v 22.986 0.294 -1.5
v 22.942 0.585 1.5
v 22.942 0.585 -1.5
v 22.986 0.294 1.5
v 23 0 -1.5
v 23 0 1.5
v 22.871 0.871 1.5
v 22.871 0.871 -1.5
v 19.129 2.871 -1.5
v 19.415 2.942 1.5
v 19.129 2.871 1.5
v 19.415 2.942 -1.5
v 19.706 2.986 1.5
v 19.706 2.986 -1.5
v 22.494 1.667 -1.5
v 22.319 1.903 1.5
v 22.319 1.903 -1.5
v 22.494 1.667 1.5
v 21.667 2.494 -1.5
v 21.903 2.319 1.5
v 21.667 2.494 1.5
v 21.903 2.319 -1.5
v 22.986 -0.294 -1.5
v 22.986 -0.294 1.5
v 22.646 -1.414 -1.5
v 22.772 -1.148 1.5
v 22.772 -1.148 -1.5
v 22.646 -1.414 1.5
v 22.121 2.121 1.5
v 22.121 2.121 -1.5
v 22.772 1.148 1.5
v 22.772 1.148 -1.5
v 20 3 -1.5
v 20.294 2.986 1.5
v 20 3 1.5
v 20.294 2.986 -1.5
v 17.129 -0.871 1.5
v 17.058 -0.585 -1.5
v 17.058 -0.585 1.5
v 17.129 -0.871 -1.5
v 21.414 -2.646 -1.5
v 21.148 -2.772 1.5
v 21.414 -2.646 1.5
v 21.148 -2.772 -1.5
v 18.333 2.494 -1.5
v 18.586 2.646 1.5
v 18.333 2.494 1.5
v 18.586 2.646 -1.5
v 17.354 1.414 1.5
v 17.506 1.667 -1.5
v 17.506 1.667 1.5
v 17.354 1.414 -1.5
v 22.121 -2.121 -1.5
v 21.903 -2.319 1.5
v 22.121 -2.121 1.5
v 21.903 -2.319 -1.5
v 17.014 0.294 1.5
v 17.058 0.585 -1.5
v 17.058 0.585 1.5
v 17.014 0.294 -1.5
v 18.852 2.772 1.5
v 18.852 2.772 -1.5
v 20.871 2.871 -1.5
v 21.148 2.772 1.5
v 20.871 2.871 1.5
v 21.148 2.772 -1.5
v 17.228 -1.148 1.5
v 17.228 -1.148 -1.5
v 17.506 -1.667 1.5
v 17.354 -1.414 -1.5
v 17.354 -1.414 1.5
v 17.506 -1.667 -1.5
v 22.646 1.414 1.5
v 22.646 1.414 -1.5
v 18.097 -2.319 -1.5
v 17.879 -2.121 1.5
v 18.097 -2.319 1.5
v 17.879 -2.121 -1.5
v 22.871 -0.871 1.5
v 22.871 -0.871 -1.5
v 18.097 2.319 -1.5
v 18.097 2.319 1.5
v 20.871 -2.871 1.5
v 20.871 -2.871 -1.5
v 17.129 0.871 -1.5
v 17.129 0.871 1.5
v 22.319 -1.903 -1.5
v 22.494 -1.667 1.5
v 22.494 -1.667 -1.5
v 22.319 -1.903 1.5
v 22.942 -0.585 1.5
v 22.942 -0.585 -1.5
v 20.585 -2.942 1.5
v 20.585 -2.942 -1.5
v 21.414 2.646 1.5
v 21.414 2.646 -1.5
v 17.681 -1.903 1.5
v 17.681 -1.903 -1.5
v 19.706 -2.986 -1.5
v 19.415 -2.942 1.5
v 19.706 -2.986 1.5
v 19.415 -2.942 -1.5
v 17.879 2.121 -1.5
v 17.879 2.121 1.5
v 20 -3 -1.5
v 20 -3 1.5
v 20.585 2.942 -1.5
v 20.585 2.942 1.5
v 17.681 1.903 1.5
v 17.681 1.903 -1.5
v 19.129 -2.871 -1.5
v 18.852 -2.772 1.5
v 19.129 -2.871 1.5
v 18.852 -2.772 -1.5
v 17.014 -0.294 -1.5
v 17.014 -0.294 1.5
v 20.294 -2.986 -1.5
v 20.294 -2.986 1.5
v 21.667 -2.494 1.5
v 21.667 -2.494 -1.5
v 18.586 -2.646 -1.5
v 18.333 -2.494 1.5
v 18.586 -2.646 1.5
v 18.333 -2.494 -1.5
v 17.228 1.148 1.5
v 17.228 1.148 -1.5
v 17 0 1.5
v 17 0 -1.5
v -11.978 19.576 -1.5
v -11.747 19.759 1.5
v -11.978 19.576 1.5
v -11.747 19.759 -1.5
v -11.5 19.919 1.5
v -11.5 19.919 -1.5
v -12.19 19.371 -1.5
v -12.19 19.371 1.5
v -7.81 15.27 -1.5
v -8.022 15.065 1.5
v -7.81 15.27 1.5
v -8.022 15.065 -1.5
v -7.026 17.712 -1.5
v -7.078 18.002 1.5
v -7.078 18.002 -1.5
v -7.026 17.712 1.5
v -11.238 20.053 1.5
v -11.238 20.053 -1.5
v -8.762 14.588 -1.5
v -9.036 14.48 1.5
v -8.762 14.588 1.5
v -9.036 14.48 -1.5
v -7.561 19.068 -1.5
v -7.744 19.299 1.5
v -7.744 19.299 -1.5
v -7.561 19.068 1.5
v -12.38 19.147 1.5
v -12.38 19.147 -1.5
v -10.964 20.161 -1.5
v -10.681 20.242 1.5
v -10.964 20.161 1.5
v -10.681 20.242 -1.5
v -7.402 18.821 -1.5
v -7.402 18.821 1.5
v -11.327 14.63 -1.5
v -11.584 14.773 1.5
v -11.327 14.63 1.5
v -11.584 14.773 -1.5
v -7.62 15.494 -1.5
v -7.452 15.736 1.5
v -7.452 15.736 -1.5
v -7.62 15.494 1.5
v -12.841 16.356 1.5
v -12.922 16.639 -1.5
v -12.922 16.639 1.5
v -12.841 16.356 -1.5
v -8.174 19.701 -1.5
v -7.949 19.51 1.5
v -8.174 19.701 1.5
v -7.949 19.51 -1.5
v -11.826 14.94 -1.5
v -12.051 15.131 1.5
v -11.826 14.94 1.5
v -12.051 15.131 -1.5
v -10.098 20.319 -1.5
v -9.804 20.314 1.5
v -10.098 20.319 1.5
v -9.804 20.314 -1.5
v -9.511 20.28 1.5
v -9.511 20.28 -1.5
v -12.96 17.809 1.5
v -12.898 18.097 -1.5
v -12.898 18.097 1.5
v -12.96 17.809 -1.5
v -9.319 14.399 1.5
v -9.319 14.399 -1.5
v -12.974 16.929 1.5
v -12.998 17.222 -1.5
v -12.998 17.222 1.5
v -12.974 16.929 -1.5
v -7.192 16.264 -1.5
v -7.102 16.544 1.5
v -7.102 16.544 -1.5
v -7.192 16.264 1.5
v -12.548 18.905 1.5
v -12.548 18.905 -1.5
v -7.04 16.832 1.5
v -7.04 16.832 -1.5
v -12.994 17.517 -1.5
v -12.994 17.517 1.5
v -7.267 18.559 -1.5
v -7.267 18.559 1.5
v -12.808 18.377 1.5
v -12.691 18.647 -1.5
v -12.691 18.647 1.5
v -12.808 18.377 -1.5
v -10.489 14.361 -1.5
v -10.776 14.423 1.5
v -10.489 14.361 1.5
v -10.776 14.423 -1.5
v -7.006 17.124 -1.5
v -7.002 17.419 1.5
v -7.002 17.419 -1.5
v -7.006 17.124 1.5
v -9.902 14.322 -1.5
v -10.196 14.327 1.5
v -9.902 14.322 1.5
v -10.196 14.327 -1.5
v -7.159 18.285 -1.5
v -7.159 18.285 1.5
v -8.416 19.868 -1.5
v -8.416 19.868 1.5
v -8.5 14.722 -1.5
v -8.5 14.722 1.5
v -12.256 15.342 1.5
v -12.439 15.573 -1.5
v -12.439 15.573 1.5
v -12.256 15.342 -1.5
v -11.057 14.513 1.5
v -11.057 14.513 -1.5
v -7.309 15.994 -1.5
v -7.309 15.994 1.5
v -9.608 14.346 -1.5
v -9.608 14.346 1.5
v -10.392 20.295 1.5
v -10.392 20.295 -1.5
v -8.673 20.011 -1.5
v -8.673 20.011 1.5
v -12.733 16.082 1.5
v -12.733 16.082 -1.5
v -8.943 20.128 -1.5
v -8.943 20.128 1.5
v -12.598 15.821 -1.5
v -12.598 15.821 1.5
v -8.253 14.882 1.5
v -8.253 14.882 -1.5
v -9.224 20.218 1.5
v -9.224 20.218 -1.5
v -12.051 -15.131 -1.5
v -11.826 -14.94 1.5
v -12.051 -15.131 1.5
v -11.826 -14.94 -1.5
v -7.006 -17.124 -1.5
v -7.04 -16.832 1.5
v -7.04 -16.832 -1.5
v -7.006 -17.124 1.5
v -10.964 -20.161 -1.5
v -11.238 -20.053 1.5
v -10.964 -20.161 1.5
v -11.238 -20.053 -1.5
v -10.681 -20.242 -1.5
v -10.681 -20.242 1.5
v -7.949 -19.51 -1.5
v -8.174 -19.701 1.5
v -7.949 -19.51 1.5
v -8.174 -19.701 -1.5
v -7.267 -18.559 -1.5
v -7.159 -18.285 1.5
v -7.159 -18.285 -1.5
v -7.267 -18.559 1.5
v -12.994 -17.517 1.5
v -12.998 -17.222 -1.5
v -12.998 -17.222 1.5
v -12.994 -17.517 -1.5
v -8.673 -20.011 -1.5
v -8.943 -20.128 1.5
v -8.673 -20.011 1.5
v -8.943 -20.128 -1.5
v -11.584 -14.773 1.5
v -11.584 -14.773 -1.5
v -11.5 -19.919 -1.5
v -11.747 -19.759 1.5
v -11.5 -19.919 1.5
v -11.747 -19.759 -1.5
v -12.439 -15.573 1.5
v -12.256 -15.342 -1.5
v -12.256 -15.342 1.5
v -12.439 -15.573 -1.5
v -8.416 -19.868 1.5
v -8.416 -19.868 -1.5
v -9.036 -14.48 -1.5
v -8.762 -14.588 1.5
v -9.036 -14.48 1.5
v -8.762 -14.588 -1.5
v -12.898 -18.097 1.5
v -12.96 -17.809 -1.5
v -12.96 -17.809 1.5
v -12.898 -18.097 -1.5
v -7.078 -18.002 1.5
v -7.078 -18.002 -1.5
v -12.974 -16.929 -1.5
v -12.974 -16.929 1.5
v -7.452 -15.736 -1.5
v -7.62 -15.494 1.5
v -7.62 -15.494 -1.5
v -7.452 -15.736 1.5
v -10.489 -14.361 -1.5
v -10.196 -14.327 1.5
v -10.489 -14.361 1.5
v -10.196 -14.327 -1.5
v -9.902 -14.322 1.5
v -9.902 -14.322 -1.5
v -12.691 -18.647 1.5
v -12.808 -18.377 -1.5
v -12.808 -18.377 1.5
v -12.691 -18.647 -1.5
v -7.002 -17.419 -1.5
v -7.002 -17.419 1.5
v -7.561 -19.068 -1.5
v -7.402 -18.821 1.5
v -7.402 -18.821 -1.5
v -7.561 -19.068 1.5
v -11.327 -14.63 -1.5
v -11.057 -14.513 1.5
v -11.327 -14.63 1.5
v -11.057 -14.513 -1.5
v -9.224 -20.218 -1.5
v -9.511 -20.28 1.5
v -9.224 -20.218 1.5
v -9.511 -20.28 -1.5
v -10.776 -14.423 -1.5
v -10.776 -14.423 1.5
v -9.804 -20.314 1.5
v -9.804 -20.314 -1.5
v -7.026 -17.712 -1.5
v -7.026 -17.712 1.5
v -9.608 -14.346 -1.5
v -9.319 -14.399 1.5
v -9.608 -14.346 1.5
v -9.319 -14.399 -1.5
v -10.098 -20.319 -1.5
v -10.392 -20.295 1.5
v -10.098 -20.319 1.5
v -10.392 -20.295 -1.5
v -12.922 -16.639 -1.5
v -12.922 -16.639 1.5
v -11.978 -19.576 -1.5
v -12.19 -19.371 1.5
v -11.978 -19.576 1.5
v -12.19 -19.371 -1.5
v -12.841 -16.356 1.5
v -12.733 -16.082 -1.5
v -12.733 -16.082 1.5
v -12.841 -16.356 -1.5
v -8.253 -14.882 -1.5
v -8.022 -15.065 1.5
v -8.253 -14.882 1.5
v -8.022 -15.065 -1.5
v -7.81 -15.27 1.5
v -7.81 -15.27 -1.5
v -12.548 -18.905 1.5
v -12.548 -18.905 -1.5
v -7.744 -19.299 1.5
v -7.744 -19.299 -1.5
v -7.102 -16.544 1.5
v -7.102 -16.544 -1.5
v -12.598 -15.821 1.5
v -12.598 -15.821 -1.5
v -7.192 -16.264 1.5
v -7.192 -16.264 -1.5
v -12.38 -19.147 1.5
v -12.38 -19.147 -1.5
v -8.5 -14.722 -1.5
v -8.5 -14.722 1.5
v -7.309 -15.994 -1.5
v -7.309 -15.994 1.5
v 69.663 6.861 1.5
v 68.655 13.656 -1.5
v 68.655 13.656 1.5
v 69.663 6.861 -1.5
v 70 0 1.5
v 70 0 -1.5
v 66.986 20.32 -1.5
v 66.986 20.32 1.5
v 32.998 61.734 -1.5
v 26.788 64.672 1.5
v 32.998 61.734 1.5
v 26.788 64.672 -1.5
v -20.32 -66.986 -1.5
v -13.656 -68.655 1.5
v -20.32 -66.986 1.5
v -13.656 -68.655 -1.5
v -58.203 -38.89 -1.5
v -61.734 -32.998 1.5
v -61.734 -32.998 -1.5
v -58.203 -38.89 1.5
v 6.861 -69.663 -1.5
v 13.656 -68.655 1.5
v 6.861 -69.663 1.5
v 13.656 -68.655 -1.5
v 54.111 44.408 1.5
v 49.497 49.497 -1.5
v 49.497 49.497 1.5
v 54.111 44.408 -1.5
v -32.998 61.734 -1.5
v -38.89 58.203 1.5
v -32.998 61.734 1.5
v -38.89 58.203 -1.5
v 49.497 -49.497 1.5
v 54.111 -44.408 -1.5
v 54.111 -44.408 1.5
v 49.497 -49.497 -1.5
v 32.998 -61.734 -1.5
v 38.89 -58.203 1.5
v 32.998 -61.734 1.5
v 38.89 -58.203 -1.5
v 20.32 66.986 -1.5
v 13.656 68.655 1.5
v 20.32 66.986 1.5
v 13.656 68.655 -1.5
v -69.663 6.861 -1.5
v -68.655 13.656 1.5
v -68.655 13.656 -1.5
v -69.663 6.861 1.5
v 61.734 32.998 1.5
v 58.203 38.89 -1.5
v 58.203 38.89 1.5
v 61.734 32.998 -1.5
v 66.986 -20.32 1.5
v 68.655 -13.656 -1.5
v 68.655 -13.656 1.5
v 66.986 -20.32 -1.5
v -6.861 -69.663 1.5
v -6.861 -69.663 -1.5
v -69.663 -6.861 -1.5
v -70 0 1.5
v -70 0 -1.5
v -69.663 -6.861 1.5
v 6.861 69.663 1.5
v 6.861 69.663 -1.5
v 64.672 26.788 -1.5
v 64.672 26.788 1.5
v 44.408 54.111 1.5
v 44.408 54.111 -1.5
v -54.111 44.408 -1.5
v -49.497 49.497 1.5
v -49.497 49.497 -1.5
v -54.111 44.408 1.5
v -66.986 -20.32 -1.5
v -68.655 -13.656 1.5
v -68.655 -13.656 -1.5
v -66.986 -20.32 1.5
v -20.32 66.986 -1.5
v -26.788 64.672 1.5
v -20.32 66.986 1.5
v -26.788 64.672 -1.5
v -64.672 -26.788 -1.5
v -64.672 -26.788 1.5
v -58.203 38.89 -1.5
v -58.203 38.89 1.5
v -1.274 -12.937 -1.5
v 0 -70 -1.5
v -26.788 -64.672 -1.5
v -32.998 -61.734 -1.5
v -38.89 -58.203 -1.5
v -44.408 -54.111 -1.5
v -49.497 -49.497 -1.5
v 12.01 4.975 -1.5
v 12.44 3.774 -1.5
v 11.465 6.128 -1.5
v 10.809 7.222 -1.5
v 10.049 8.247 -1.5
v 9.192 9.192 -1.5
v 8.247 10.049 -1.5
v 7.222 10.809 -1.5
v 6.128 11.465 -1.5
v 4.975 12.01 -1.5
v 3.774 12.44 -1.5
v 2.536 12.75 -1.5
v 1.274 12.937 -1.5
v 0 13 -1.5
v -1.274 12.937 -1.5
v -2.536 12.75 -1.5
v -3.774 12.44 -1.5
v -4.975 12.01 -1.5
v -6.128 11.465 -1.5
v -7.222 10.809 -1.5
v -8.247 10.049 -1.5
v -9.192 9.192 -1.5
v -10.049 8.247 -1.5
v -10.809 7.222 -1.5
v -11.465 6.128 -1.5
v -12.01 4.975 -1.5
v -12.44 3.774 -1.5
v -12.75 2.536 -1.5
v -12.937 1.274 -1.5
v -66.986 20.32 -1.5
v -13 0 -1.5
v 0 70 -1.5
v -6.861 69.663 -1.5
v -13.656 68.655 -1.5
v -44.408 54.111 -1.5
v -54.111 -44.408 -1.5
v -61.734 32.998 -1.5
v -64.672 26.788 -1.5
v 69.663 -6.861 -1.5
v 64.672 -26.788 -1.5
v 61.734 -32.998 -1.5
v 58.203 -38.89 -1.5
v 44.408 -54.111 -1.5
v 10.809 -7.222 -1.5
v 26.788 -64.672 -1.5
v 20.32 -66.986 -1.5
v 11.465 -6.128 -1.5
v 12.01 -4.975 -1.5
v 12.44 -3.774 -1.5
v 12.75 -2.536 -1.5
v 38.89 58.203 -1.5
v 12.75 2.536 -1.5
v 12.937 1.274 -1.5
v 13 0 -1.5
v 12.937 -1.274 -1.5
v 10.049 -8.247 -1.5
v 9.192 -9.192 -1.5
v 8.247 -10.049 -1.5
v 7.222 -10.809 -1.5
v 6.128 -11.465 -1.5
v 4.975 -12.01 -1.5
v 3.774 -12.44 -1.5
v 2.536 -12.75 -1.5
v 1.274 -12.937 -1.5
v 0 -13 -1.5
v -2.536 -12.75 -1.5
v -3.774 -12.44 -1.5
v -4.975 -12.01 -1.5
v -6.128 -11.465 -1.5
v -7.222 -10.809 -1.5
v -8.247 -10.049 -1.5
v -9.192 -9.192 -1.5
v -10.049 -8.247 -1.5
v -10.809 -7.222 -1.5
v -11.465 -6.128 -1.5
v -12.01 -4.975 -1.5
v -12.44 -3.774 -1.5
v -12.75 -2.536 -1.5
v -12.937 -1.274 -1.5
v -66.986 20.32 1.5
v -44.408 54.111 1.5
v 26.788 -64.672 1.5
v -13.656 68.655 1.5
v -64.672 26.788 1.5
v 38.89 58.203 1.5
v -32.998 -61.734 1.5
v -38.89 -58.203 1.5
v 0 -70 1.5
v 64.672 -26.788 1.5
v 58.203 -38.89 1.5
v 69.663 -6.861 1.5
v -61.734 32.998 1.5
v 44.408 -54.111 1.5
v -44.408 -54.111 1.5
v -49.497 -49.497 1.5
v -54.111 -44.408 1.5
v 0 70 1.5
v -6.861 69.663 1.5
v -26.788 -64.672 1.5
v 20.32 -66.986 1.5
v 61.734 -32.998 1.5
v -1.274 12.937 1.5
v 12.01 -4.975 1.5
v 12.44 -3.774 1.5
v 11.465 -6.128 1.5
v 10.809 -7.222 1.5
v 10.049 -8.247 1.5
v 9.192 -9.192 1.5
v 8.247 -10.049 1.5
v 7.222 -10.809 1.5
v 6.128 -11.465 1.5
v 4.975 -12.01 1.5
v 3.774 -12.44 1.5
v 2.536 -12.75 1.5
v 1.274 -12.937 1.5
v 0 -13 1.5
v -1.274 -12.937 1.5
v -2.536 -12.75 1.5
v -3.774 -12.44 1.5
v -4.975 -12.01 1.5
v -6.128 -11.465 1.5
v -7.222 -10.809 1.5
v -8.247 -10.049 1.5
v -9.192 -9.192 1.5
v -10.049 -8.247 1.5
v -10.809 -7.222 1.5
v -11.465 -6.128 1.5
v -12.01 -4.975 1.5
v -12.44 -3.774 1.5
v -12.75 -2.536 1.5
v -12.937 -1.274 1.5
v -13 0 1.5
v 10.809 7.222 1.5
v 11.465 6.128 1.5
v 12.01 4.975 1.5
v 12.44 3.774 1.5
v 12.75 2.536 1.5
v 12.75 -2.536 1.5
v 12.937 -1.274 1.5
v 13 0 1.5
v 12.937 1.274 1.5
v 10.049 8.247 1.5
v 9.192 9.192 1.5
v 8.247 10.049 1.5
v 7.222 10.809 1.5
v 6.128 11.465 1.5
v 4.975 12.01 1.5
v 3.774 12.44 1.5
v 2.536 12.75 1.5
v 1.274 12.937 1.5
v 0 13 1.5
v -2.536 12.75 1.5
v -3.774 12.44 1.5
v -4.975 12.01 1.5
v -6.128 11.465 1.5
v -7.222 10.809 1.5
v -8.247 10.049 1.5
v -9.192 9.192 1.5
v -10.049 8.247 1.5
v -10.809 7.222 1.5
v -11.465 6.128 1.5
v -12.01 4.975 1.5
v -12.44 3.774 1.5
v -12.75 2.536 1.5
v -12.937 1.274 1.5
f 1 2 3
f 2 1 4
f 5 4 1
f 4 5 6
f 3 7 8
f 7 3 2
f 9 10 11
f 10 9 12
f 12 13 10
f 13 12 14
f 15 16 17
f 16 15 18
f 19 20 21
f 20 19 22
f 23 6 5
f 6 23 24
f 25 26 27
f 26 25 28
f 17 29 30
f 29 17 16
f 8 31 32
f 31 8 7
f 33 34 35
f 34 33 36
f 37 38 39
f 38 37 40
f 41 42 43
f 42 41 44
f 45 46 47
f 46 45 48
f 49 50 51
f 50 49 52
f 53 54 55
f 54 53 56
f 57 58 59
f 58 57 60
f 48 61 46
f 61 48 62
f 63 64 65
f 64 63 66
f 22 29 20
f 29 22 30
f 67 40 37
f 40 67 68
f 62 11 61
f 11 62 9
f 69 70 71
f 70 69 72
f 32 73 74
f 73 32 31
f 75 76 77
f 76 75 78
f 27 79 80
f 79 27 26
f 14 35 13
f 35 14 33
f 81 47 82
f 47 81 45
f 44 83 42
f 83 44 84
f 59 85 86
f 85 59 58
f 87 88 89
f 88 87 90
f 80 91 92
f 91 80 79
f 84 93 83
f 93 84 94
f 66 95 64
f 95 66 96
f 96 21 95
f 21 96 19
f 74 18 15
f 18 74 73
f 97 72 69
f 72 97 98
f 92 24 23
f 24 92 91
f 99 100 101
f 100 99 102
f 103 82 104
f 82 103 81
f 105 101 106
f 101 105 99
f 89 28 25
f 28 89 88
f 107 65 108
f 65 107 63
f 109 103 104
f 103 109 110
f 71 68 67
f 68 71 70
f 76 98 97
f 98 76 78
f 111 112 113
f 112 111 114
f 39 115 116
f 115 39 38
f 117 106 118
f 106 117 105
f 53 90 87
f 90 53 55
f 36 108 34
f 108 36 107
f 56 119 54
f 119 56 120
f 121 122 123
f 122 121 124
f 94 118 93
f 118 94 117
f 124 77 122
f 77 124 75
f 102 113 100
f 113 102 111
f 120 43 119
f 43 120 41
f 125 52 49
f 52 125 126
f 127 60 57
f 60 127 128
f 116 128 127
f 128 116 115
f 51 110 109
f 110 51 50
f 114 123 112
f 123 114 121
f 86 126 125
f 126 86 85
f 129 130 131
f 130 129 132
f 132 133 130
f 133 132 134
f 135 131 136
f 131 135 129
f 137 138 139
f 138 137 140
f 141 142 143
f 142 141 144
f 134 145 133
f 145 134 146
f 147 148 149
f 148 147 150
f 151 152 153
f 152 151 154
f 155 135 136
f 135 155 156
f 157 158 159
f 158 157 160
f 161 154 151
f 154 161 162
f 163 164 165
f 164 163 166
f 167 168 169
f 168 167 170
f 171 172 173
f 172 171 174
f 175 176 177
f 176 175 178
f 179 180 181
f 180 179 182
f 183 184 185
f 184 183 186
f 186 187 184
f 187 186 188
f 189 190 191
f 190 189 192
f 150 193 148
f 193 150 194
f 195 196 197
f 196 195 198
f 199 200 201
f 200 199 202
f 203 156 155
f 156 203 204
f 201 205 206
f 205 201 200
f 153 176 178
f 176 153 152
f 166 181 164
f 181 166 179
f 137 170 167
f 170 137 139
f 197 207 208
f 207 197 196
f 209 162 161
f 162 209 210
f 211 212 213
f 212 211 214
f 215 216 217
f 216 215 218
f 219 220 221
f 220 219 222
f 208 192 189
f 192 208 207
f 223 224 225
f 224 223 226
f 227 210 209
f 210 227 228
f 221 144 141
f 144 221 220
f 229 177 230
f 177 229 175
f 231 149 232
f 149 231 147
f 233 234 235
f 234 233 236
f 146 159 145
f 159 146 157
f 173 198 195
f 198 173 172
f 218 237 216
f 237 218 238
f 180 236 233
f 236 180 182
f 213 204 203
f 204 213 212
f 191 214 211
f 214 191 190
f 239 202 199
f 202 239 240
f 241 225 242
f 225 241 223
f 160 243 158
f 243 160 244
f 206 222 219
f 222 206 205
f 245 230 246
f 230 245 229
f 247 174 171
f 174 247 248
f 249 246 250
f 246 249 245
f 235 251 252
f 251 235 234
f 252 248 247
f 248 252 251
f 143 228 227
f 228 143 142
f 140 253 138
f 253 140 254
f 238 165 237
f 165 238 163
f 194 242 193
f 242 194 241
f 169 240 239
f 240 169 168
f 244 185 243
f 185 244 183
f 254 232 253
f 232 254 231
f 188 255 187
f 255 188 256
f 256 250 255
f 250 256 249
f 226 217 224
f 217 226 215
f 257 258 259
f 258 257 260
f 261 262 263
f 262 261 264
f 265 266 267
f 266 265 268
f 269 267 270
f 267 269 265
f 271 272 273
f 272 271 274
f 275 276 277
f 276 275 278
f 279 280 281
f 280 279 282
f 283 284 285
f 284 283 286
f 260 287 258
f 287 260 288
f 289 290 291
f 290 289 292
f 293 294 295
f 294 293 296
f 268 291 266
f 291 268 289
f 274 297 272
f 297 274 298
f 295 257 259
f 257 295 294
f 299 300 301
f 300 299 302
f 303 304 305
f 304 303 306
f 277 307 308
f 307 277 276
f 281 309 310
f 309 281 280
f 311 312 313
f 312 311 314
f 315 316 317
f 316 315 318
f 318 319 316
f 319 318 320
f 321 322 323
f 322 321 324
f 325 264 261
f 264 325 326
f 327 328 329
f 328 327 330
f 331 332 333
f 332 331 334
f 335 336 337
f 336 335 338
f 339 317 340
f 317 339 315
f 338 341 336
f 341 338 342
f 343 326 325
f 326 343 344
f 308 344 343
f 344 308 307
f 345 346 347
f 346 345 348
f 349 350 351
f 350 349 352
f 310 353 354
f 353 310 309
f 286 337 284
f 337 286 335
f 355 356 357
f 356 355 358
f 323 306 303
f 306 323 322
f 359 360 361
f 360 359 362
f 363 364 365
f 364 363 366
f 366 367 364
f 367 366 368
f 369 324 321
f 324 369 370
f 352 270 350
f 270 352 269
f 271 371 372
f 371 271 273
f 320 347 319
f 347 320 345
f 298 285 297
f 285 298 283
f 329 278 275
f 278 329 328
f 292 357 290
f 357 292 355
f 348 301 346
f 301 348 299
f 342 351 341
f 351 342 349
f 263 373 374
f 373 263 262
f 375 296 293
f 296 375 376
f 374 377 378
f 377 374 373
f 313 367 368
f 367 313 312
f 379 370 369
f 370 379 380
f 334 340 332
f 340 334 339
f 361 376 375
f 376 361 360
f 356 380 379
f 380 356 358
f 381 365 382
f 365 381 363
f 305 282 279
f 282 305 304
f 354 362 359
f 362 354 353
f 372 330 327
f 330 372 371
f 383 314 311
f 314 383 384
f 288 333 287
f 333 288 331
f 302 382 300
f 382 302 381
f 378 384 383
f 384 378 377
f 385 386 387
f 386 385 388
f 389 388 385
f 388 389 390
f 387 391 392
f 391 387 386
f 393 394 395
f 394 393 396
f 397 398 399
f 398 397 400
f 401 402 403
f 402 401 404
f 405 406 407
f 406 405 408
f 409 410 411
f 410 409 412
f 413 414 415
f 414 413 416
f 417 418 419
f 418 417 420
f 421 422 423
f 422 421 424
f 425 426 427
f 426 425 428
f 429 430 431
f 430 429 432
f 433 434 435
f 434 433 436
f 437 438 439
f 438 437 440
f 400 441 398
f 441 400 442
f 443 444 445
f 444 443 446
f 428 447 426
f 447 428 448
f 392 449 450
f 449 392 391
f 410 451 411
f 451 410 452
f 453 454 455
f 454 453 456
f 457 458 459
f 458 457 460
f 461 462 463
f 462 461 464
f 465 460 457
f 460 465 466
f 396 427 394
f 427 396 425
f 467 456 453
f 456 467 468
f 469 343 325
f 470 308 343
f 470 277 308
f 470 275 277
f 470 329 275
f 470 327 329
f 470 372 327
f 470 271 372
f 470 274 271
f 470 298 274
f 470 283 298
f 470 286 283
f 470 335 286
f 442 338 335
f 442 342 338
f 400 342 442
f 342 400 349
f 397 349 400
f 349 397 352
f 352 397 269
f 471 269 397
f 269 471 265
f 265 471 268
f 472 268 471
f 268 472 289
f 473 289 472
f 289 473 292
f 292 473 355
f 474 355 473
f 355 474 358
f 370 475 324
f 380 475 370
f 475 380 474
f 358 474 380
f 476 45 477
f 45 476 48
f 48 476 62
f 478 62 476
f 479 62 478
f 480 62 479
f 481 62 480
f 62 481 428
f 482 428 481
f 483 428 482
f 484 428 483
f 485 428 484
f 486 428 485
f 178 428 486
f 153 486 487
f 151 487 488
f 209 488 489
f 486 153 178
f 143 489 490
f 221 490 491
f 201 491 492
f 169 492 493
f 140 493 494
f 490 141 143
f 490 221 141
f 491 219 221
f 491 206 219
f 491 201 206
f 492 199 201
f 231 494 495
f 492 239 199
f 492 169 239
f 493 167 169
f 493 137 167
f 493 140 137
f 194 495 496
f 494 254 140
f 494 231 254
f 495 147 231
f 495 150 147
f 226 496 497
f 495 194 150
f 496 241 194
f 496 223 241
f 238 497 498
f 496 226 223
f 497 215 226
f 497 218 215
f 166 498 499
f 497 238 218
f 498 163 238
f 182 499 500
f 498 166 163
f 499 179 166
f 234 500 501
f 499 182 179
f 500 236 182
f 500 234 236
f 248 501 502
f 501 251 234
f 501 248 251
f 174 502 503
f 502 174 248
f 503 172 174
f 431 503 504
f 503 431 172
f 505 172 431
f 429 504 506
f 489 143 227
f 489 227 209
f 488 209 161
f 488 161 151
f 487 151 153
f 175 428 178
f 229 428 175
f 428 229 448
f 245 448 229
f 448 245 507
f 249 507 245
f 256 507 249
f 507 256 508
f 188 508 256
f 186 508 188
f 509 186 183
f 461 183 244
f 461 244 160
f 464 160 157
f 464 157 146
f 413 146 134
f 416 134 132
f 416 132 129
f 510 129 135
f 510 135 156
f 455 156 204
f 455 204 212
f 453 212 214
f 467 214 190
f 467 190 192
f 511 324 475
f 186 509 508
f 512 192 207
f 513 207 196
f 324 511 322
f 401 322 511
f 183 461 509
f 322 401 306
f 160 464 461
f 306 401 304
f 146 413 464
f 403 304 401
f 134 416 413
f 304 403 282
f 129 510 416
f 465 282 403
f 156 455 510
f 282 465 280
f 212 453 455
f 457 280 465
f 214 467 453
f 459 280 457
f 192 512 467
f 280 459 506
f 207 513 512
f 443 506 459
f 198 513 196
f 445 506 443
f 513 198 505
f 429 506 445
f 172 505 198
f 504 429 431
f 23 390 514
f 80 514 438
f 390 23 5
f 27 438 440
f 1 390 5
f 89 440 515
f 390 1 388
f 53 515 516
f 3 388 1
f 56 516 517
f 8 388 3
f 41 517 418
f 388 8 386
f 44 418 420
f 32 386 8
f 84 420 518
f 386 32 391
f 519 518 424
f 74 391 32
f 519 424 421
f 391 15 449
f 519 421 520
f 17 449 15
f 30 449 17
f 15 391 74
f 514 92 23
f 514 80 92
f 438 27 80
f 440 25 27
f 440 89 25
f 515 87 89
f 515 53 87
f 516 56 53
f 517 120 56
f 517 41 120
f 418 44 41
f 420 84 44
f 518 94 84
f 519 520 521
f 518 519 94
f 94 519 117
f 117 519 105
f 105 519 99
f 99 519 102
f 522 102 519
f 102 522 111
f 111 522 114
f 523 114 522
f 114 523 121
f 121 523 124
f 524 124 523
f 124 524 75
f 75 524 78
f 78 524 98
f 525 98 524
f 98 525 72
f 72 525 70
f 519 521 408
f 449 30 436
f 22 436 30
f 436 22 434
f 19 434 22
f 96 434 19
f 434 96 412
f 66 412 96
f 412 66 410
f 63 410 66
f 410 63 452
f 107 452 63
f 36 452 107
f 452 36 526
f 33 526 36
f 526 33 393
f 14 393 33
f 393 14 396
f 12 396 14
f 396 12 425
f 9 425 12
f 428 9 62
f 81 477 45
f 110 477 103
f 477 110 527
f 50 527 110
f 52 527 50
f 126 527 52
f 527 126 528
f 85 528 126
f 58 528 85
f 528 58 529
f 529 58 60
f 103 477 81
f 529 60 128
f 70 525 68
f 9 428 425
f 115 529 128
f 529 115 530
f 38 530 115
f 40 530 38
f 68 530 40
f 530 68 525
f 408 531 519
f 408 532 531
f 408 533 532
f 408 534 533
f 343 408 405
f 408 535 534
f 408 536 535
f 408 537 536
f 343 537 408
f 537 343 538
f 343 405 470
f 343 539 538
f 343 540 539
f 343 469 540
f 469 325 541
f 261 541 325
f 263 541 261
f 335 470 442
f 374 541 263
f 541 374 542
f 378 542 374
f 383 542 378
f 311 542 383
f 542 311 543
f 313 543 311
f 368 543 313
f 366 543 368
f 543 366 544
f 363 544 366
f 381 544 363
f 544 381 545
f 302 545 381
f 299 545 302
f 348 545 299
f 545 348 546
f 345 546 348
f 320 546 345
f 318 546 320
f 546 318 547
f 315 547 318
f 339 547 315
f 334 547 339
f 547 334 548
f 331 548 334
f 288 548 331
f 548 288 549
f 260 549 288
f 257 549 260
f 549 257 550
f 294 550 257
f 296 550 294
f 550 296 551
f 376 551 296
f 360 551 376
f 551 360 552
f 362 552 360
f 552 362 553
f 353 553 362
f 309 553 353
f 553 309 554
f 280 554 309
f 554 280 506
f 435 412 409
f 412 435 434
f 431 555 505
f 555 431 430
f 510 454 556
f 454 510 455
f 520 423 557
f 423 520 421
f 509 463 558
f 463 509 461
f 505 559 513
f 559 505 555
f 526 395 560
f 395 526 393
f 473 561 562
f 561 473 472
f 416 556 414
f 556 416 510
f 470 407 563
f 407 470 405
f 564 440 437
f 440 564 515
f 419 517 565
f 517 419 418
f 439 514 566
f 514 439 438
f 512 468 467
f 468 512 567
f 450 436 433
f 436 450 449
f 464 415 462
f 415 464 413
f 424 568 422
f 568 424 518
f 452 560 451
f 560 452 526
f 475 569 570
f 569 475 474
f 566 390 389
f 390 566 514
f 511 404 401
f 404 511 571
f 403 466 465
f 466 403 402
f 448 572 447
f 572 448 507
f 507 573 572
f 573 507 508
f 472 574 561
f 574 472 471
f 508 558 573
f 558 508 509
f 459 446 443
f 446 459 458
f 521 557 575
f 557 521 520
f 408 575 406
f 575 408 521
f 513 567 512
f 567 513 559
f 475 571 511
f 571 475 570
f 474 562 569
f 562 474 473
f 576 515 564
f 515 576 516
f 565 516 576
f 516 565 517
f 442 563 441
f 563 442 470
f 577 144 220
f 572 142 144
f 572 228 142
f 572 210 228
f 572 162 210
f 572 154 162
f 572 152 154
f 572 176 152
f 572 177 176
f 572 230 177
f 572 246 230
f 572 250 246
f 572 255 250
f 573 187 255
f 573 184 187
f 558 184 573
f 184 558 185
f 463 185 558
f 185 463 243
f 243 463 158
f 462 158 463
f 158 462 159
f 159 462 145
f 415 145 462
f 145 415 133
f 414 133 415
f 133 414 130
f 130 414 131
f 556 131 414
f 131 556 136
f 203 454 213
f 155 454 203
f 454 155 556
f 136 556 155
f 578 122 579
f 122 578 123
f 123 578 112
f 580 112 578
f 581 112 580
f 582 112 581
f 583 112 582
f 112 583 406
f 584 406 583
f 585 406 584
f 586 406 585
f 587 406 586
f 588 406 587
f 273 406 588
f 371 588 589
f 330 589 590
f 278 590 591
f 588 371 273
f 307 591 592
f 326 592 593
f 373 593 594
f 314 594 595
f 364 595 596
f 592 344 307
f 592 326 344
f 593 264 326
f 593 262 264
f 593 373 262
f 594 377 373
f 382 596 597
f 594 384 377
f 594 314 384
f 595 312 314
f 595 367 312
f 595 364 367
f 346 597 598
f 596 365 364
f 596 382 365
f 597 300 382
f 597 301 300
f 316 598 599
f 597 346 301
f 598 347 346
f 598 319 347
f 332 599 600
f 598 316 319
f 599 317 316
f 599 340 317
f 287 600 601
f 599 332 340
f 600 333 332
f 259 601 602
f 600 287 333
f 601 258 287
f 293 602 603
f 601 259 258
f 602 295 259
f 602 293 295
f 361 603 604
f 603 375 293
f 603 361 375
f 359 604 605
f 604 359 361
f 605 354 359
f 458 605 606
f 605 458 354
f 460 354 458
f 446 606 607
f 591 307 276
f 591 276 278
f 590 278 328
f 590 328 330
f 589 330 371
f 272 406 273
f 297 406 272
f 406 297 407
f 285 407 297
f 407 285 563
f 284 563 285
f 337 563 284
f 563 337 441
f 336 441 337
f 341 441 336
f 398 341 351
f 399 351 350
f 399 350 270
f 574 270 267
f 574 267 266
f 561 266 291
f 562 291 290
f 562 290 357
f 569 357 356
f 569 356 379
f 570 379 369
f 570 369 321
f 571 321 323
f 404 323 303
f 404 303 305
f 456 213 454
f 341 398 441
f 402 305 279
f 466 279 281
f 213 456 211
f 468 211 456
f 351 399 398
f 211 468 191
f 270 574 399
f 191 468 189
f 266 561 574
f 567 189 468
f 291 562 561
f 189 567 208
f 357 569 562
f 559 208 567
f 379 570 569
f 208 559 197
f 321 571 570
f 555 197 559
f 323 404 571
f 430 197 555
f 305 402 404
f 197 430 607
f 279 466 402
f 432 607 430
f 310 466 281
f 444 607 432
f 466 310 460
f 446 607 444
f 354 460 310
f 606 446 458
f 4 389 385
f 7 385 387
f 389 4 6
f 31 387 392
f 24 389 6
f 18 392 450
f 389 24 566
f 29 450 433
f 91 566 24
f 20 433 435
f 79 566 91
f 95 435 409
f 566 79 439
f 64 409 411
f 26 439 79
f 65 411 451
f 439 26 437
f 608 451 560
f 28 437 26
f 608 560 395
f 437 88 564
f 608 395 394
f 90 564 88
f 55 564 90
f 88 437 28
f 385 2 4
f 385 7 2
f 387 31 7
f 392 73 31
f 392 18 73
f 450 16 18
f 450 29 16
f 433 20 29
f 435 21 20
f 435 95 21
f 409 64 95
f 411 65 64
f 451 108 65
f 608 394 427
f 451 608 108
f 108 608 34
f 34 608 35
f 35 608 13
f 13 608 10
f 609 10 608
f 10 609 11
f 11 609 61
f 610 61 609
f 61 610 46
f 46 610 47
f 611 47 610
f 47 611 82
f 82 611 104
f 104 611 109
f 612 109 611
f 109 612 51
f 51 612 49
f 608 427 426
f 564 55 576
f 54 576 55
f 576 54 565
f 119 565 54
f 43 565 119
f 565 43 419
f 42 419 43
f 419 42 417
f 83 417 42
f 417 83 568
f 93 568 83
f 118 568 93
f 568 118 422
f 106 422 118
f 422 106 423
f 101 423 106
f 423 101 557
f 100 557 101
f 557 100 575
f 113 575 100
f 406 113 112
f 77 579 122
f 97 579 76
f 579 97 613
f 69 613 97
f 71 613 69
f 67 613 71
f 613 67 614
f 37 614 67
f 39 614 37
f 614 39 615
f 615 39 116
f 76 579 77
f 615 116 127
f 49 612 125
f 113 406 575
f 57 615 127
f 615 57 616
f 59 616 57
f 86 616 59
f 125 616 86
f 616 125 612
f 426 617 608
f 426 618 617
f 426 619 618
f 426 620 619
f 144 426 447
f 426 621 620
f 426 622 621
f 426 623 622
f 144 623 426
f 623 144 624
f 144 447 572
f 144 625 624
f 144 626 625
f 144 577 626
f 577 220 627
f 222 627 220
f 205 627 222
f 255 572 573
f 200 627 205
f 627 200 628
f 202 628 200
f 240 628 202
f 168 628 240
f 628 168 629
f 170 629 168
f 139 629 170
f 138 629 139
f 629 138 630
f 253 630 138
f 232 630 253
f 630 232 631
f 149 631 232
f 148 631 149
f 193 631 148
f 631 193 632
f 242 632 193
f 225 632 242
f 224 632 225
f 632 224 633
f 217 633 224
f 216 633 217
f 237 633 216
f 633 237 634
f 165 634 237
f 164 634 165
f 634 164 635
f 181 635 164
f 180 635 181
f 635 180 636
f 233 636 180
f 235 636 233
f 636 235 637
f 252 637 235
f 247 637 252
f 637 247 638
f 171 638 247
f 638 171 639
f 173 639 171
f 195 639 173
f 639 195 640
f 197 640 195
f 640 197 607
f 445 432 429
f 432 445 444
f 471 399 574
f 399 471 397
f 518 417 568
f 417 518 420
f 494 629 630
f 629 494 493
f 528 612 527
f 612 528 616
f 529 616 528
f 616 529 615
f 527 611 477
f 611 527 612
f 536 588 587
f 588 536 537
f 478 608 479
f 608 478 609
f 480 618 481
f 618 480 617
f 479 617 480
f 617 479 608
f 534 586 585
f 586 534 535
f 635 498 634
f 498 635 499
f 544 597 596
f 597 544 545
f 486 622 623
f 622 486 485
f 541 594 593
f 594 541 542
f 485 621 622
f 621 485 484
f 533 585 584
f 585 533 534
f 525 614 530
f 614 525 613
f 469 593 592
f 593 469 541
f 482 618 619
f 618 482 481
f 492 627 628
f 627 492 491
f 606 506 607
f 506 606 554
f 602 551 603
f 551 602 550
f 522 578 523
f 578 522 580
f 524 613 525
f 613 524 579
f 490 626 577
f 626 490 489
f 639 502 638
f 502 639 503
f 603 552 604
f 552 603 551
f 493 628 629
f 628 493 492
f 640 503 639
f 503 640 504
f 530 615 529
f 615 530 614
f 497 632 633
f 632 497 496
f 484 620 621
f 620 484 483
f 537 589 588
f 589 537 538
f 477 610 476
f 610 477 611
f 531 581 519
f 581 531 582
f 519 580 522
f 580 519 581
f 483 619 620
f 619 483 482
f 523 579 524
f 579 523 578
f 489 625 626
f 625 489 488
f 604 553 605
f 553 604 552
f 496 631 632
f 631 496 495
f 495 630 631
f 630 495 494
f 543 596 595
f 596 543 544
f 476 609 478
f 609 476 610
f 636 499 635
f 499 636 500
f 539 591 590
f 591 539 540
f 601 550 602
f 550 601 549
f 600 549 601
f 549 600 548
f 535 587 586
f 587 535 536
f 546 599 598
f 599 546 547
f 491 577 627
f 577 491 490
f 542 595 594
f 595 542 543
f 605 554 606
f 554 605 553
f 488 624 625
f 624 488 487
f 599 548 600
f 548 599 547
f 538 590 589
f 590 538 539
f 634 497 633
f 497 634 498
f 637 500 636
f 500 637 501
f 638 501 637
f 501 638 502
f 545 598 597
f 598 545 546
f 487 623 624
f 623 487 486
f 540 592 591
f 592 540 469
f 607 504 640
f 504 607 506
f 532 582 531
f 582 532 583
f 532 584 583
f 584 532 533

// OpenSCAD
module DriveSprocket()
{
  $fn = 64;

  thickness = 3;

  difference()
  {
    cylinder(d=140, h=thickness, center=true);

    cylinder(d=26, h=thickness+1, center=true);

    for (a = [0 : 360 / 3: 359])
    {
      rotate([0, 0, a])
      {
        translate([20, 0, 0])
        {
          cylinder(d=6, h=thickness+1, center=true);
        }
      }
    }
  }
}

DriveSprocket();
